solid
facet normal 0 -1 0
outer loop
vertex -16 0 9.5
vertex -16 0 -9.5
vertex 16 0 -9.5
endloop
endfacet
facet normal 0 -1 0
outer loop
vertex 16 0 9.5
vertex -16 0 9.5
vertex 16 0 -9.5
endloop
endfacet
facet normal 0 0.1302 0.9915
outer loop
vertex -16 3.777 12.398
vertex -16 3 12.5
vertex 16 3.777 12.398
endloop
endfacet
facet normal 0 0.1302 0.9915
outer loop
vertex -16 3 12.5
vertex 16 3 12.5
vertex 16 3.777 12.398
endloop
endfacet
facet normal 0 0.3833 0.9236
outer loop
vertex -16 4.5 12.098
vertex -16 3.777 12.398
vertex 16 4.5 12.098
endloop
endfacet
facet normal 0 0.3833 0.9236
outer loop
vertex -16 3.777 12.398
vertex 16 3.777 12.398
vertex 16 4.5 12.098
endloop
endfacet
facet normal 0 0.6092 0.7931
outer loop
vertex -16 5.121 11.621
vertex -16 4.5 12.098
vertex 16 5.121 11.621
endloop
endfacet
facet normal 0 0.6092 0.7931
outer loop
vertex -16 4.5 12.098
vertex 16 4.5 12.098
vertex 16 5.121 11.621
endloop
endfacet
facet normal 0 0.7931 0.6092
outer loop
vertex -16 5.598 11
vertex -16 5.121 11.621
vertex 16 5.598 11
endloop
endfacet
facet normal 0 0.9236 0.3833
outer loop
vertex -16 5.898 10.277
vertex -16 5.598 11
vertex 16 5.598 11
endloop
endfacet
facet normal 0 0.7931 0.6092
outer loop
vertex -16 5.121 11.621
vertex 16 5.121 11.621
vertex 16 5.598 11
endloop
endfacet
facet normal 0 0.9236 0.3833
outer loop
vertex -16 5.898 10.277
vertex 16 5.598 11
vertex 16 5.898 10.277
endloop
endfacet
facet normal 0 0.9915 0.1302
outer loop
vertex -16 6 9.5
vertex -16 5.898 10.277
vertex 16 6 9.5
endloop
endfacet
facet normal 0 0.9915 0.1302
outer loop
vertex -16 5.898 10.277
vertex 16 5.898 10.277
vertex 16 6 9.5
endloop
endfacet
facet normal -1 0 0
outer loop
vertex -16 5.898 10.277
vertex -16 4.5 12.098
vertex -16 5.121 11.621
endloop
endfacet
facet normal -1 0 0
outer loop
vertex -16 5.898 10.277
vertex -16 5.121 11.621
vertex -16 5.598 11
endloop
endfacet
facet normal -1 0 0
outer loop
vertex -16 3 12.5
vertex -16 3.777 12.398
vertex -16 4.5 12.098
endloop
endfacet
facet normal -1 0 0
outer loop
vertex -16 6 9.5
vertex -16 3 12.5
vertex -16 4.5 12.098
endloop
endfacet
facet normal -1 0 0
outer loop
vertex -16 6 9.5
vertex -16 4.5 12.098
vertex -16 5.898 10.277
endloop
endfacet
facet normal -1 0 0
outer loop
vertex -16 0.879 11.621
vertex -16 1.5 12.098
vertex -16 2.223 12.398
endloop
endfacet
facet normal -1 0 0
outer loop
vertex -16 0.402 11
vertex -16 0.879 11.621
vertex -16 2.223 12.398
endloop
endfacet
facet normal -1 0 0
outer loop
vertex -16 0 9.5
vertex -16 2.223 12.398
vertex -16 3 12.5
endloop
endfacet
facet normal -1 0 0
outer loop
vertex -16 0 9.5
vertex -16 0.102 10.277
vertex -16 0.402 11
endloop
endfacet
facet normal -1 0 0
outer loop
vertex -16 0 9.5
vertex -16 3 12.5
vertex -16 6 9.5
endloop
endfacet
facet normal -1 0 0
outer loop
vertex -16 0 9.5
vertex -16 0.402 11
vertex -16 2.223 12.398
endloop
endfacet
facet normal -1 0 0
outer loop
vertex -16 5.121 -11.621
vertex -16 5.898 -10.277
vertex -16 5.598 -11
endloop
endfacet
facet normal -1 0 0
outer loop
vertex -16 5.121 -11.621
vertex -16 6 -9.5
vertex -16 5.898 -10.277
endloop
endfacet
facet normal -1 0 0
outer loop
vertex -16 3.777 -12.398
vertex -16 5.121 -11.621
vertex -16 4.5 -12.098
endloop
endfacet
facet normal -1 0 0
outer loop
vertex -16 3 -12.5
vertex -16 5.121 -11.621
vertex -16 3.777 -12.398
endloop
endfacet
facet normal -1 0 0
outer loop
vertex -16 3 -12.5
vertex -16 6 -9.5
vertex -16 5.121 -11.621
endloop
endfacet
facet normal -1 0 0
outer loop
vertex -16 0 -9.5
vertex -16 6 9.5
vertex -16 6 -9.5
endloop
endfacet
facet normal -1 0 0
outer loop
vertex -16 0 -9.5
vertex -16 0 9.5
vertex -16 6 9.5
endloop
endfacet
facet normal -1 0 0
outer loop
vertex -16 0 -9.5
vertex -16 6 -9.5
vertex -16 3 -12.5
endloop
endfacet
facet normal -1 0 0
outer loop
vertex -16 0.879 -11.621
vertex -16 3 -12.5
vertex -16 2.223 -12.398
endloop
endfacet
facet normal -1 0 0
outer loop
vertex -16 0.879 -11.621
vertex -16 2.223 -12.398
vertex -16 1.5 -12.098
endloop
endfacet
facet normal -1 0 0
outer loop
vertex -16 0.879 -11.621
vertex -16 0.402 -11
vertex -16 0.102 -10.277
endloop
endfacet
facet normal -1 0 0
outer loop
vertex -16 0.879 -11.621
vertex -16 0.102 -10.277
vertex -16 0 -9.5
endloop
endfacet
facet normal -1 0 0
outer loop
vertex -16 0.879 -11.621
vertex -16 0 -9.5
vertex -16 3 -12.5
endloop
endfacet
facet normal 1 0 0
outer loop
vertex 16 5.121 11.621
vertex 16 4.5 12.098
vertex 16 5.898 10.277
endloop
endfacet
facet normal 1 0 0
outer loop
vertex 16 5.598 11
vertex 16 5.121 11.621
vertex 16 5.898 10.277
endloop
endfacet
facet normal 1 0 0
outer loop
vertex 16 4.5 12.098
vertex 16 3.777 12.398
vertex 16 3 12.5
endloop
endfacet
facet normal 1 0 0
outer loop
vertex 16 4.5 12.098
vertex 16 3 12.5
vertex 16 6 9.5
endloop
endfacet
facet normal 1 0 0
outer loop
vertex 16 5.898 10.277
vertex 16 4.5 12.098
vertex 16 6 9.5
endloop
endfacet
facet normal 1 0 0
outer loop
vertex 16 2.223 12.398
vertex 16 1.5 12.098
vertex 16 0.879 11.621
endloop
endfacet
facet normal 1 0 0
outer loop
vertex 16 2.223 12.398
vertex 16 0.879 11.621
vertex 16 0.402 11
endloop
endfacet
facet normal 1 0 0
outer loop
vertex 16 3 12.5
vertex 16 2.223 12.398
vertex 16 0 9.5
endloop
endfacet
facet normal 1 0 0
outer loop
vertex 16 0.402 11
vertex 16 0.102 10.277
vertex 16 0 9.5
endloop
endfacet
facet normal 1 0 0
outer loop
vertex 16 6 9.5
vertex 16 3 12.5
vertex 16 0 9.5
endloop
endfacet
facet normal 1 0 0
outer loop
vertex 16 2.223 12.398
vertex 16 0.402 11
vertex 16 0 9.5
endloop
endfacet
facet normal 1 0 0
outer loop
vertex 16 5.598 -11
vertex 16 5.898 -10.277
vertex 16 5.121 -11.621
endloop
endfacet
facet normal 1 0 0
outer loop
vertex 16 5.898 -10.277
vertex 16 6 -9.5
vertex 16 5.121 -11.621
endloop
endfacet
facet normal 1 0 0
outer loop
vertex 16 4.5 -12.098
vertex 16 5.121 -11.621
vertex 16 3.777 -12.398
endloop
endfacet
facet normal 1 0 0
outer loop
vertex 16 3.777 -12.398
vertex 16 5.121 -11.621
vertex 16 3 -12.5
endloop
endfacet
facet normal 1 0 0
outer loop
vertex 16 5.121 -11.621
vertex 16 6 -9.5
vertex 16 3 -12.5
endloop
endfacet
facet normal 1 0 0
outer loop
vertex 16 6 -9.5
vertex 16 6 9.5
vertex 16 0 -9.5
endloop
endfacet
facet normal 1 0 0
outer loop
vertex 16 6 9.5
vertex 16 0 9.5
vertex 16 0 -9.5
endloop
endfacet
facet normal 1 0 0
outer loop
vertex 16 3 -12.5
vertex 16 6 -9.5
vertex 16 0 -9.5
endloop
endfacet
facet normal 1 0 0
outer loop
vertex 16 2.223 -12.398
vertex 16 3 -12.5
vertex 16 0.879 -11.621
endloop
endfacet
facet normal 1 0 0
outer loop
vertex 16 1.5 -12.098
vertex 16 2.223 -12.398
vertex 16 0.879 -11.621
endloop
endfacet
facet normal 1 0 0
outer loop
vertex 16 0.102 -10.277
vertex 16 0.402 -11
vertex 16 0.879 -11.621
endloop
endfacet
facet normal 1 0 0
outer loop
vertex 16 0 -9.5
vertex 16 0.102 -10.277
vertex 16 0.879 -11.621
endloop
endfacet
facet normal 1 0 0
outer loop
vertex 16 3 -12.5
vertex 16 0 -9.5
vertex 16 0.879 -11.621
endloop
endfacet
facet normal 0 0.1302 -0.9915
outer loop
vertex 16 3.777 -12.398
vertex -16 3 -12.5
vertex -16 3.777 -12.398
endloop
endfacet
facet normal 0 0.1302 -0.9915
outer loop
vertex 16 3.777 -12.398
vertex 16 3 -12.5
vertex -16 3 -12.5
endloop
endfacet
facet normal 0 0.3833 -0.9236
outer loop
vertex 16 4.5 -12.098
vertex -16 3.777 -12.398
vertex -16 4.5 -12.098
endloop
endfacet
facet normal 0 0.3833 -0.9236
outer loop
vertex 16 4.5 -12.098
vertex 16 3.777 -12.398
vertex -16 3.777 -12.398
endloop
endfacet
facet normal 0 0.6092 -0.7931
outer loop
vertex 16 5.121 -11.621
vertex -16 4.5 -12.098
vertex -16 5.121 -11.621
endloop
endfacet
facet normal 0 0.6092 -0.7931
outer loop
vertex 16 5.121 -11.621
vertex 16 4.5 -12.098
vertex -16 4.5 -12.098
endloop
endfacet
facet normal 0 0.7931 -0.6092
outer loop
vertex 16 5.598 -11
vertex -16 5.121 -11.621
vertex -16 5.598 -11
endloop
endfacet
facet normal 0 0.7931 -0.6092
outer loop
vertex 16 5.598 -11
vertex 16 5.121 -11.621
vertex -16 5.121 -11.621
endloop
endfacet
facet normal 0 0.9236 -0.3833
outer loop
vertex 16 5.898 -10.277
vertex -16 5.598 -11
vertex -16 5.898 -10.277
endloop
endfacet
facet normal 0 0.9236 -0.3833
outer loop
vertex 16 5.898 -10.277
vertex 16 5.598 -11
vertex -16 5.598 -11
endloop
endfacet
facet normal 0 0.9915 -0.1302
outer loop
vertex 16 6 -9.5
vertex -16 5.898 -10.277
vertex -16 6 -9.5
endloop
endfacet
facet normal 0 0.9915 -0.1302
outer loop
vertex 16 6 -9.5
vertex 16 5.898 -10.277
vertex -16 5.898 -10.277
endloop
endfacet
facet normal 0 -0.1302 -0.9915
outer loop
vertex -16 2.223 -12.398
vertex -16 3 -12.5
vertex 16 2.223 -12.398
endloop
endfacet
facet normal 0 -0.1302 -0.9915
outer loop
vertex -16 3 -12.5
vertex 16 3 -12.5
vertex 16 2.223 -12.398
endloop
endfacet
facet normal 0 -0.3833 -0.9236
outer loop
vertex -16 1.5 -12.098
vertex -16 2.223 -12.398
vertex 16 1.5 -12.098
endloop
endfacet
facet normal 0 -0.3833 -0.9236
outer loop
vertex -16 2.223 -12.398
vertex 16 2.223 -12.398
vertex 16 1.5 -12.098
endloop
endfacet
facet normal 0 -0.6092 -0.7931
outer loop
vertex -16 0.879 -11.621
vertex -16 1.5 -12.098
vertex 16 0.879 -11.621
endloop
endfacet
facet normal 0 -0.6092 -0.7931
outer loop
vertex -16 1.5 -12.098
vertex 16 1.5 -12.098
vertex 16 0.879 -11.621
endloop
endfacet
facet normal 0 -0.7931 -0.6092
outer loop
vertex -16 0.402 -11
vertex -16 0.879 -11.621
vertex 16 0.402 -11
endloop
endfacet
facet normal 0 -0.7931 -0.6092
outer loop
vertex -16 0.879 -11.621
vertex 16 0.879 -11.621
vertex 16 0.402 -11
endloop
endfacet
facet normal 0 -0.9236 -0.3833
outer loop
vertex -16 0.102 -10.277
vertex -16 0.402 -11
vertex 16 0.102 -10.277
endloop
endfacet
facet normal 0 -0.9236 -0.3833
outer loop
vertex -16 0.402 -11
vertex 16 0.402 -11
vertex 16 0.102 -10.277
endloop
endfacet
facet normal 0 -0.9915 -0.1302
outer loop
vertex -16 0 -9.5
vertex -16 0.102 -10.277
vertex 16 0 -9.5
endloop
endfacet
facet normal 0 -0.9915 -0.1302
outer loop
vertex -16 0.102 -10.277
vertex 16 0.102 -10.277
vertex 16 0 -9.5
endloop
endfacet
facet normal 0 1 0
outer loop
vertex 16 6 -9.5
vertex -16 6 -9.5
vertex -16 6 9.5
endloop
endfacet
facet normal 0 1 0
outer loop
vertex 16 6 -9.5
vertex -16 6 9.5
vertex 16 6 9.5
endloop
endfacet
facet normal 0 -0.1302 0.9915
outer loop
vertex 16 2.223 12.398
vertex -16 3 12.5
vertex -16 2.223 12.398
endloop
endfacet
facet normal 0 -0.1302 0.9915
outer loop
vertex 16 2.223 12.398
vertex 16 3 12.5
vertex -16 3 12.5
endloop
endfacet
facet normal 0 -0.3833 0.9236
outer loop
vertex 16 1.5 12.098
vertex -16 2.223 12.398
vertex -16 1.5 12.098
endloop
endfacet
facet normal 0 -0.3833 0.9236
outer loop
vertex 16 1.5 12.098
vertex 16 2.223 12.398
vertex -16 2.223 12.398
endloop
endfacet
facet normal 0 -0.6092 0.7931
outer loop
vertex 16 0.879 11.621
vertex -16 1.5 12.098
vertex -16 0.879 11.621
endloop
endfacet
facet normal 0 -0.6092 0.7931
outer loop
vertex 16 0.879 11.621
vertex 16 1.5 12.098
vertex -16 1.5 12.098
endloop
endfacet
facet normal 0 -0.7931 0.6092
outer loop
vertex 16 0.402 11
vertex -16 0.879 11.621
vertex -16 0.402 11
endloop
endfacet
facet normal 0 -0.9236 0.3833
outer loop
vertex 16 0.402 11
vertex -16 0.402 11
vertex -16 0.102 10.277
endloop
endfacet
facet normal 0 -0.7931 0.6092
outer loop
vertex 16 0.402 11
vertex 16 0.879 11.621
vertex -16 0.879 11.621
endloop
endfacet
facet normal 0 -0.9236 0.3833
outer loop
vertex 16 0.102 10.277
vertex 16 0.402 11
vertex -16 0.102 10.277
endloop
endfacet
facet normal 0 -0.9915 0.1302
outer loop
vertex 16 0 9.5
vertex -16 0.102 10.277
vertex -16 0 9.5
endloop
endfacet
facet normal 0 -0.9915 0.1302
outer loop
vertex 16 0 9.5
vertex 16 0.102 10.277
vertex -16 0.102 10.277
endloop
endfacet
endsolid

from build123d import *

# Parameters (mm, degrees)
SKETCH_1_W      = 32
SKETCH_1_H      = 25
EXTRUDE_1_DEPTH = 6
FILLET_1_R      = 3


with BuildPart() as part:
    # 草图1 → 凸台-拉伸1 (new body)
    with BuildSketch(Plane(origin=(0, 0, 0), x_dir=(1, 0, 0), z_dir=(0, 1, 0))):
        Rectangle(SKETCH_1_W, SKETCH_1_H)
    extrude(amount=EXTRUDE_1_DEPTH)

    # 圆角1
    fillet_1_edges = [part.edges().sort_by_distance(p)[0] for p in [
        (0, 0, -12.5),
        (0, 6, -12.5),
        (0, 6, 12.5),
        (0, 0, 12.5),
    ]]
    fillet(fillet_1_edges, radius=FILLET_1_R - 0.0001)  # a hair under: the kernel refuses the full size


solid = part.part
